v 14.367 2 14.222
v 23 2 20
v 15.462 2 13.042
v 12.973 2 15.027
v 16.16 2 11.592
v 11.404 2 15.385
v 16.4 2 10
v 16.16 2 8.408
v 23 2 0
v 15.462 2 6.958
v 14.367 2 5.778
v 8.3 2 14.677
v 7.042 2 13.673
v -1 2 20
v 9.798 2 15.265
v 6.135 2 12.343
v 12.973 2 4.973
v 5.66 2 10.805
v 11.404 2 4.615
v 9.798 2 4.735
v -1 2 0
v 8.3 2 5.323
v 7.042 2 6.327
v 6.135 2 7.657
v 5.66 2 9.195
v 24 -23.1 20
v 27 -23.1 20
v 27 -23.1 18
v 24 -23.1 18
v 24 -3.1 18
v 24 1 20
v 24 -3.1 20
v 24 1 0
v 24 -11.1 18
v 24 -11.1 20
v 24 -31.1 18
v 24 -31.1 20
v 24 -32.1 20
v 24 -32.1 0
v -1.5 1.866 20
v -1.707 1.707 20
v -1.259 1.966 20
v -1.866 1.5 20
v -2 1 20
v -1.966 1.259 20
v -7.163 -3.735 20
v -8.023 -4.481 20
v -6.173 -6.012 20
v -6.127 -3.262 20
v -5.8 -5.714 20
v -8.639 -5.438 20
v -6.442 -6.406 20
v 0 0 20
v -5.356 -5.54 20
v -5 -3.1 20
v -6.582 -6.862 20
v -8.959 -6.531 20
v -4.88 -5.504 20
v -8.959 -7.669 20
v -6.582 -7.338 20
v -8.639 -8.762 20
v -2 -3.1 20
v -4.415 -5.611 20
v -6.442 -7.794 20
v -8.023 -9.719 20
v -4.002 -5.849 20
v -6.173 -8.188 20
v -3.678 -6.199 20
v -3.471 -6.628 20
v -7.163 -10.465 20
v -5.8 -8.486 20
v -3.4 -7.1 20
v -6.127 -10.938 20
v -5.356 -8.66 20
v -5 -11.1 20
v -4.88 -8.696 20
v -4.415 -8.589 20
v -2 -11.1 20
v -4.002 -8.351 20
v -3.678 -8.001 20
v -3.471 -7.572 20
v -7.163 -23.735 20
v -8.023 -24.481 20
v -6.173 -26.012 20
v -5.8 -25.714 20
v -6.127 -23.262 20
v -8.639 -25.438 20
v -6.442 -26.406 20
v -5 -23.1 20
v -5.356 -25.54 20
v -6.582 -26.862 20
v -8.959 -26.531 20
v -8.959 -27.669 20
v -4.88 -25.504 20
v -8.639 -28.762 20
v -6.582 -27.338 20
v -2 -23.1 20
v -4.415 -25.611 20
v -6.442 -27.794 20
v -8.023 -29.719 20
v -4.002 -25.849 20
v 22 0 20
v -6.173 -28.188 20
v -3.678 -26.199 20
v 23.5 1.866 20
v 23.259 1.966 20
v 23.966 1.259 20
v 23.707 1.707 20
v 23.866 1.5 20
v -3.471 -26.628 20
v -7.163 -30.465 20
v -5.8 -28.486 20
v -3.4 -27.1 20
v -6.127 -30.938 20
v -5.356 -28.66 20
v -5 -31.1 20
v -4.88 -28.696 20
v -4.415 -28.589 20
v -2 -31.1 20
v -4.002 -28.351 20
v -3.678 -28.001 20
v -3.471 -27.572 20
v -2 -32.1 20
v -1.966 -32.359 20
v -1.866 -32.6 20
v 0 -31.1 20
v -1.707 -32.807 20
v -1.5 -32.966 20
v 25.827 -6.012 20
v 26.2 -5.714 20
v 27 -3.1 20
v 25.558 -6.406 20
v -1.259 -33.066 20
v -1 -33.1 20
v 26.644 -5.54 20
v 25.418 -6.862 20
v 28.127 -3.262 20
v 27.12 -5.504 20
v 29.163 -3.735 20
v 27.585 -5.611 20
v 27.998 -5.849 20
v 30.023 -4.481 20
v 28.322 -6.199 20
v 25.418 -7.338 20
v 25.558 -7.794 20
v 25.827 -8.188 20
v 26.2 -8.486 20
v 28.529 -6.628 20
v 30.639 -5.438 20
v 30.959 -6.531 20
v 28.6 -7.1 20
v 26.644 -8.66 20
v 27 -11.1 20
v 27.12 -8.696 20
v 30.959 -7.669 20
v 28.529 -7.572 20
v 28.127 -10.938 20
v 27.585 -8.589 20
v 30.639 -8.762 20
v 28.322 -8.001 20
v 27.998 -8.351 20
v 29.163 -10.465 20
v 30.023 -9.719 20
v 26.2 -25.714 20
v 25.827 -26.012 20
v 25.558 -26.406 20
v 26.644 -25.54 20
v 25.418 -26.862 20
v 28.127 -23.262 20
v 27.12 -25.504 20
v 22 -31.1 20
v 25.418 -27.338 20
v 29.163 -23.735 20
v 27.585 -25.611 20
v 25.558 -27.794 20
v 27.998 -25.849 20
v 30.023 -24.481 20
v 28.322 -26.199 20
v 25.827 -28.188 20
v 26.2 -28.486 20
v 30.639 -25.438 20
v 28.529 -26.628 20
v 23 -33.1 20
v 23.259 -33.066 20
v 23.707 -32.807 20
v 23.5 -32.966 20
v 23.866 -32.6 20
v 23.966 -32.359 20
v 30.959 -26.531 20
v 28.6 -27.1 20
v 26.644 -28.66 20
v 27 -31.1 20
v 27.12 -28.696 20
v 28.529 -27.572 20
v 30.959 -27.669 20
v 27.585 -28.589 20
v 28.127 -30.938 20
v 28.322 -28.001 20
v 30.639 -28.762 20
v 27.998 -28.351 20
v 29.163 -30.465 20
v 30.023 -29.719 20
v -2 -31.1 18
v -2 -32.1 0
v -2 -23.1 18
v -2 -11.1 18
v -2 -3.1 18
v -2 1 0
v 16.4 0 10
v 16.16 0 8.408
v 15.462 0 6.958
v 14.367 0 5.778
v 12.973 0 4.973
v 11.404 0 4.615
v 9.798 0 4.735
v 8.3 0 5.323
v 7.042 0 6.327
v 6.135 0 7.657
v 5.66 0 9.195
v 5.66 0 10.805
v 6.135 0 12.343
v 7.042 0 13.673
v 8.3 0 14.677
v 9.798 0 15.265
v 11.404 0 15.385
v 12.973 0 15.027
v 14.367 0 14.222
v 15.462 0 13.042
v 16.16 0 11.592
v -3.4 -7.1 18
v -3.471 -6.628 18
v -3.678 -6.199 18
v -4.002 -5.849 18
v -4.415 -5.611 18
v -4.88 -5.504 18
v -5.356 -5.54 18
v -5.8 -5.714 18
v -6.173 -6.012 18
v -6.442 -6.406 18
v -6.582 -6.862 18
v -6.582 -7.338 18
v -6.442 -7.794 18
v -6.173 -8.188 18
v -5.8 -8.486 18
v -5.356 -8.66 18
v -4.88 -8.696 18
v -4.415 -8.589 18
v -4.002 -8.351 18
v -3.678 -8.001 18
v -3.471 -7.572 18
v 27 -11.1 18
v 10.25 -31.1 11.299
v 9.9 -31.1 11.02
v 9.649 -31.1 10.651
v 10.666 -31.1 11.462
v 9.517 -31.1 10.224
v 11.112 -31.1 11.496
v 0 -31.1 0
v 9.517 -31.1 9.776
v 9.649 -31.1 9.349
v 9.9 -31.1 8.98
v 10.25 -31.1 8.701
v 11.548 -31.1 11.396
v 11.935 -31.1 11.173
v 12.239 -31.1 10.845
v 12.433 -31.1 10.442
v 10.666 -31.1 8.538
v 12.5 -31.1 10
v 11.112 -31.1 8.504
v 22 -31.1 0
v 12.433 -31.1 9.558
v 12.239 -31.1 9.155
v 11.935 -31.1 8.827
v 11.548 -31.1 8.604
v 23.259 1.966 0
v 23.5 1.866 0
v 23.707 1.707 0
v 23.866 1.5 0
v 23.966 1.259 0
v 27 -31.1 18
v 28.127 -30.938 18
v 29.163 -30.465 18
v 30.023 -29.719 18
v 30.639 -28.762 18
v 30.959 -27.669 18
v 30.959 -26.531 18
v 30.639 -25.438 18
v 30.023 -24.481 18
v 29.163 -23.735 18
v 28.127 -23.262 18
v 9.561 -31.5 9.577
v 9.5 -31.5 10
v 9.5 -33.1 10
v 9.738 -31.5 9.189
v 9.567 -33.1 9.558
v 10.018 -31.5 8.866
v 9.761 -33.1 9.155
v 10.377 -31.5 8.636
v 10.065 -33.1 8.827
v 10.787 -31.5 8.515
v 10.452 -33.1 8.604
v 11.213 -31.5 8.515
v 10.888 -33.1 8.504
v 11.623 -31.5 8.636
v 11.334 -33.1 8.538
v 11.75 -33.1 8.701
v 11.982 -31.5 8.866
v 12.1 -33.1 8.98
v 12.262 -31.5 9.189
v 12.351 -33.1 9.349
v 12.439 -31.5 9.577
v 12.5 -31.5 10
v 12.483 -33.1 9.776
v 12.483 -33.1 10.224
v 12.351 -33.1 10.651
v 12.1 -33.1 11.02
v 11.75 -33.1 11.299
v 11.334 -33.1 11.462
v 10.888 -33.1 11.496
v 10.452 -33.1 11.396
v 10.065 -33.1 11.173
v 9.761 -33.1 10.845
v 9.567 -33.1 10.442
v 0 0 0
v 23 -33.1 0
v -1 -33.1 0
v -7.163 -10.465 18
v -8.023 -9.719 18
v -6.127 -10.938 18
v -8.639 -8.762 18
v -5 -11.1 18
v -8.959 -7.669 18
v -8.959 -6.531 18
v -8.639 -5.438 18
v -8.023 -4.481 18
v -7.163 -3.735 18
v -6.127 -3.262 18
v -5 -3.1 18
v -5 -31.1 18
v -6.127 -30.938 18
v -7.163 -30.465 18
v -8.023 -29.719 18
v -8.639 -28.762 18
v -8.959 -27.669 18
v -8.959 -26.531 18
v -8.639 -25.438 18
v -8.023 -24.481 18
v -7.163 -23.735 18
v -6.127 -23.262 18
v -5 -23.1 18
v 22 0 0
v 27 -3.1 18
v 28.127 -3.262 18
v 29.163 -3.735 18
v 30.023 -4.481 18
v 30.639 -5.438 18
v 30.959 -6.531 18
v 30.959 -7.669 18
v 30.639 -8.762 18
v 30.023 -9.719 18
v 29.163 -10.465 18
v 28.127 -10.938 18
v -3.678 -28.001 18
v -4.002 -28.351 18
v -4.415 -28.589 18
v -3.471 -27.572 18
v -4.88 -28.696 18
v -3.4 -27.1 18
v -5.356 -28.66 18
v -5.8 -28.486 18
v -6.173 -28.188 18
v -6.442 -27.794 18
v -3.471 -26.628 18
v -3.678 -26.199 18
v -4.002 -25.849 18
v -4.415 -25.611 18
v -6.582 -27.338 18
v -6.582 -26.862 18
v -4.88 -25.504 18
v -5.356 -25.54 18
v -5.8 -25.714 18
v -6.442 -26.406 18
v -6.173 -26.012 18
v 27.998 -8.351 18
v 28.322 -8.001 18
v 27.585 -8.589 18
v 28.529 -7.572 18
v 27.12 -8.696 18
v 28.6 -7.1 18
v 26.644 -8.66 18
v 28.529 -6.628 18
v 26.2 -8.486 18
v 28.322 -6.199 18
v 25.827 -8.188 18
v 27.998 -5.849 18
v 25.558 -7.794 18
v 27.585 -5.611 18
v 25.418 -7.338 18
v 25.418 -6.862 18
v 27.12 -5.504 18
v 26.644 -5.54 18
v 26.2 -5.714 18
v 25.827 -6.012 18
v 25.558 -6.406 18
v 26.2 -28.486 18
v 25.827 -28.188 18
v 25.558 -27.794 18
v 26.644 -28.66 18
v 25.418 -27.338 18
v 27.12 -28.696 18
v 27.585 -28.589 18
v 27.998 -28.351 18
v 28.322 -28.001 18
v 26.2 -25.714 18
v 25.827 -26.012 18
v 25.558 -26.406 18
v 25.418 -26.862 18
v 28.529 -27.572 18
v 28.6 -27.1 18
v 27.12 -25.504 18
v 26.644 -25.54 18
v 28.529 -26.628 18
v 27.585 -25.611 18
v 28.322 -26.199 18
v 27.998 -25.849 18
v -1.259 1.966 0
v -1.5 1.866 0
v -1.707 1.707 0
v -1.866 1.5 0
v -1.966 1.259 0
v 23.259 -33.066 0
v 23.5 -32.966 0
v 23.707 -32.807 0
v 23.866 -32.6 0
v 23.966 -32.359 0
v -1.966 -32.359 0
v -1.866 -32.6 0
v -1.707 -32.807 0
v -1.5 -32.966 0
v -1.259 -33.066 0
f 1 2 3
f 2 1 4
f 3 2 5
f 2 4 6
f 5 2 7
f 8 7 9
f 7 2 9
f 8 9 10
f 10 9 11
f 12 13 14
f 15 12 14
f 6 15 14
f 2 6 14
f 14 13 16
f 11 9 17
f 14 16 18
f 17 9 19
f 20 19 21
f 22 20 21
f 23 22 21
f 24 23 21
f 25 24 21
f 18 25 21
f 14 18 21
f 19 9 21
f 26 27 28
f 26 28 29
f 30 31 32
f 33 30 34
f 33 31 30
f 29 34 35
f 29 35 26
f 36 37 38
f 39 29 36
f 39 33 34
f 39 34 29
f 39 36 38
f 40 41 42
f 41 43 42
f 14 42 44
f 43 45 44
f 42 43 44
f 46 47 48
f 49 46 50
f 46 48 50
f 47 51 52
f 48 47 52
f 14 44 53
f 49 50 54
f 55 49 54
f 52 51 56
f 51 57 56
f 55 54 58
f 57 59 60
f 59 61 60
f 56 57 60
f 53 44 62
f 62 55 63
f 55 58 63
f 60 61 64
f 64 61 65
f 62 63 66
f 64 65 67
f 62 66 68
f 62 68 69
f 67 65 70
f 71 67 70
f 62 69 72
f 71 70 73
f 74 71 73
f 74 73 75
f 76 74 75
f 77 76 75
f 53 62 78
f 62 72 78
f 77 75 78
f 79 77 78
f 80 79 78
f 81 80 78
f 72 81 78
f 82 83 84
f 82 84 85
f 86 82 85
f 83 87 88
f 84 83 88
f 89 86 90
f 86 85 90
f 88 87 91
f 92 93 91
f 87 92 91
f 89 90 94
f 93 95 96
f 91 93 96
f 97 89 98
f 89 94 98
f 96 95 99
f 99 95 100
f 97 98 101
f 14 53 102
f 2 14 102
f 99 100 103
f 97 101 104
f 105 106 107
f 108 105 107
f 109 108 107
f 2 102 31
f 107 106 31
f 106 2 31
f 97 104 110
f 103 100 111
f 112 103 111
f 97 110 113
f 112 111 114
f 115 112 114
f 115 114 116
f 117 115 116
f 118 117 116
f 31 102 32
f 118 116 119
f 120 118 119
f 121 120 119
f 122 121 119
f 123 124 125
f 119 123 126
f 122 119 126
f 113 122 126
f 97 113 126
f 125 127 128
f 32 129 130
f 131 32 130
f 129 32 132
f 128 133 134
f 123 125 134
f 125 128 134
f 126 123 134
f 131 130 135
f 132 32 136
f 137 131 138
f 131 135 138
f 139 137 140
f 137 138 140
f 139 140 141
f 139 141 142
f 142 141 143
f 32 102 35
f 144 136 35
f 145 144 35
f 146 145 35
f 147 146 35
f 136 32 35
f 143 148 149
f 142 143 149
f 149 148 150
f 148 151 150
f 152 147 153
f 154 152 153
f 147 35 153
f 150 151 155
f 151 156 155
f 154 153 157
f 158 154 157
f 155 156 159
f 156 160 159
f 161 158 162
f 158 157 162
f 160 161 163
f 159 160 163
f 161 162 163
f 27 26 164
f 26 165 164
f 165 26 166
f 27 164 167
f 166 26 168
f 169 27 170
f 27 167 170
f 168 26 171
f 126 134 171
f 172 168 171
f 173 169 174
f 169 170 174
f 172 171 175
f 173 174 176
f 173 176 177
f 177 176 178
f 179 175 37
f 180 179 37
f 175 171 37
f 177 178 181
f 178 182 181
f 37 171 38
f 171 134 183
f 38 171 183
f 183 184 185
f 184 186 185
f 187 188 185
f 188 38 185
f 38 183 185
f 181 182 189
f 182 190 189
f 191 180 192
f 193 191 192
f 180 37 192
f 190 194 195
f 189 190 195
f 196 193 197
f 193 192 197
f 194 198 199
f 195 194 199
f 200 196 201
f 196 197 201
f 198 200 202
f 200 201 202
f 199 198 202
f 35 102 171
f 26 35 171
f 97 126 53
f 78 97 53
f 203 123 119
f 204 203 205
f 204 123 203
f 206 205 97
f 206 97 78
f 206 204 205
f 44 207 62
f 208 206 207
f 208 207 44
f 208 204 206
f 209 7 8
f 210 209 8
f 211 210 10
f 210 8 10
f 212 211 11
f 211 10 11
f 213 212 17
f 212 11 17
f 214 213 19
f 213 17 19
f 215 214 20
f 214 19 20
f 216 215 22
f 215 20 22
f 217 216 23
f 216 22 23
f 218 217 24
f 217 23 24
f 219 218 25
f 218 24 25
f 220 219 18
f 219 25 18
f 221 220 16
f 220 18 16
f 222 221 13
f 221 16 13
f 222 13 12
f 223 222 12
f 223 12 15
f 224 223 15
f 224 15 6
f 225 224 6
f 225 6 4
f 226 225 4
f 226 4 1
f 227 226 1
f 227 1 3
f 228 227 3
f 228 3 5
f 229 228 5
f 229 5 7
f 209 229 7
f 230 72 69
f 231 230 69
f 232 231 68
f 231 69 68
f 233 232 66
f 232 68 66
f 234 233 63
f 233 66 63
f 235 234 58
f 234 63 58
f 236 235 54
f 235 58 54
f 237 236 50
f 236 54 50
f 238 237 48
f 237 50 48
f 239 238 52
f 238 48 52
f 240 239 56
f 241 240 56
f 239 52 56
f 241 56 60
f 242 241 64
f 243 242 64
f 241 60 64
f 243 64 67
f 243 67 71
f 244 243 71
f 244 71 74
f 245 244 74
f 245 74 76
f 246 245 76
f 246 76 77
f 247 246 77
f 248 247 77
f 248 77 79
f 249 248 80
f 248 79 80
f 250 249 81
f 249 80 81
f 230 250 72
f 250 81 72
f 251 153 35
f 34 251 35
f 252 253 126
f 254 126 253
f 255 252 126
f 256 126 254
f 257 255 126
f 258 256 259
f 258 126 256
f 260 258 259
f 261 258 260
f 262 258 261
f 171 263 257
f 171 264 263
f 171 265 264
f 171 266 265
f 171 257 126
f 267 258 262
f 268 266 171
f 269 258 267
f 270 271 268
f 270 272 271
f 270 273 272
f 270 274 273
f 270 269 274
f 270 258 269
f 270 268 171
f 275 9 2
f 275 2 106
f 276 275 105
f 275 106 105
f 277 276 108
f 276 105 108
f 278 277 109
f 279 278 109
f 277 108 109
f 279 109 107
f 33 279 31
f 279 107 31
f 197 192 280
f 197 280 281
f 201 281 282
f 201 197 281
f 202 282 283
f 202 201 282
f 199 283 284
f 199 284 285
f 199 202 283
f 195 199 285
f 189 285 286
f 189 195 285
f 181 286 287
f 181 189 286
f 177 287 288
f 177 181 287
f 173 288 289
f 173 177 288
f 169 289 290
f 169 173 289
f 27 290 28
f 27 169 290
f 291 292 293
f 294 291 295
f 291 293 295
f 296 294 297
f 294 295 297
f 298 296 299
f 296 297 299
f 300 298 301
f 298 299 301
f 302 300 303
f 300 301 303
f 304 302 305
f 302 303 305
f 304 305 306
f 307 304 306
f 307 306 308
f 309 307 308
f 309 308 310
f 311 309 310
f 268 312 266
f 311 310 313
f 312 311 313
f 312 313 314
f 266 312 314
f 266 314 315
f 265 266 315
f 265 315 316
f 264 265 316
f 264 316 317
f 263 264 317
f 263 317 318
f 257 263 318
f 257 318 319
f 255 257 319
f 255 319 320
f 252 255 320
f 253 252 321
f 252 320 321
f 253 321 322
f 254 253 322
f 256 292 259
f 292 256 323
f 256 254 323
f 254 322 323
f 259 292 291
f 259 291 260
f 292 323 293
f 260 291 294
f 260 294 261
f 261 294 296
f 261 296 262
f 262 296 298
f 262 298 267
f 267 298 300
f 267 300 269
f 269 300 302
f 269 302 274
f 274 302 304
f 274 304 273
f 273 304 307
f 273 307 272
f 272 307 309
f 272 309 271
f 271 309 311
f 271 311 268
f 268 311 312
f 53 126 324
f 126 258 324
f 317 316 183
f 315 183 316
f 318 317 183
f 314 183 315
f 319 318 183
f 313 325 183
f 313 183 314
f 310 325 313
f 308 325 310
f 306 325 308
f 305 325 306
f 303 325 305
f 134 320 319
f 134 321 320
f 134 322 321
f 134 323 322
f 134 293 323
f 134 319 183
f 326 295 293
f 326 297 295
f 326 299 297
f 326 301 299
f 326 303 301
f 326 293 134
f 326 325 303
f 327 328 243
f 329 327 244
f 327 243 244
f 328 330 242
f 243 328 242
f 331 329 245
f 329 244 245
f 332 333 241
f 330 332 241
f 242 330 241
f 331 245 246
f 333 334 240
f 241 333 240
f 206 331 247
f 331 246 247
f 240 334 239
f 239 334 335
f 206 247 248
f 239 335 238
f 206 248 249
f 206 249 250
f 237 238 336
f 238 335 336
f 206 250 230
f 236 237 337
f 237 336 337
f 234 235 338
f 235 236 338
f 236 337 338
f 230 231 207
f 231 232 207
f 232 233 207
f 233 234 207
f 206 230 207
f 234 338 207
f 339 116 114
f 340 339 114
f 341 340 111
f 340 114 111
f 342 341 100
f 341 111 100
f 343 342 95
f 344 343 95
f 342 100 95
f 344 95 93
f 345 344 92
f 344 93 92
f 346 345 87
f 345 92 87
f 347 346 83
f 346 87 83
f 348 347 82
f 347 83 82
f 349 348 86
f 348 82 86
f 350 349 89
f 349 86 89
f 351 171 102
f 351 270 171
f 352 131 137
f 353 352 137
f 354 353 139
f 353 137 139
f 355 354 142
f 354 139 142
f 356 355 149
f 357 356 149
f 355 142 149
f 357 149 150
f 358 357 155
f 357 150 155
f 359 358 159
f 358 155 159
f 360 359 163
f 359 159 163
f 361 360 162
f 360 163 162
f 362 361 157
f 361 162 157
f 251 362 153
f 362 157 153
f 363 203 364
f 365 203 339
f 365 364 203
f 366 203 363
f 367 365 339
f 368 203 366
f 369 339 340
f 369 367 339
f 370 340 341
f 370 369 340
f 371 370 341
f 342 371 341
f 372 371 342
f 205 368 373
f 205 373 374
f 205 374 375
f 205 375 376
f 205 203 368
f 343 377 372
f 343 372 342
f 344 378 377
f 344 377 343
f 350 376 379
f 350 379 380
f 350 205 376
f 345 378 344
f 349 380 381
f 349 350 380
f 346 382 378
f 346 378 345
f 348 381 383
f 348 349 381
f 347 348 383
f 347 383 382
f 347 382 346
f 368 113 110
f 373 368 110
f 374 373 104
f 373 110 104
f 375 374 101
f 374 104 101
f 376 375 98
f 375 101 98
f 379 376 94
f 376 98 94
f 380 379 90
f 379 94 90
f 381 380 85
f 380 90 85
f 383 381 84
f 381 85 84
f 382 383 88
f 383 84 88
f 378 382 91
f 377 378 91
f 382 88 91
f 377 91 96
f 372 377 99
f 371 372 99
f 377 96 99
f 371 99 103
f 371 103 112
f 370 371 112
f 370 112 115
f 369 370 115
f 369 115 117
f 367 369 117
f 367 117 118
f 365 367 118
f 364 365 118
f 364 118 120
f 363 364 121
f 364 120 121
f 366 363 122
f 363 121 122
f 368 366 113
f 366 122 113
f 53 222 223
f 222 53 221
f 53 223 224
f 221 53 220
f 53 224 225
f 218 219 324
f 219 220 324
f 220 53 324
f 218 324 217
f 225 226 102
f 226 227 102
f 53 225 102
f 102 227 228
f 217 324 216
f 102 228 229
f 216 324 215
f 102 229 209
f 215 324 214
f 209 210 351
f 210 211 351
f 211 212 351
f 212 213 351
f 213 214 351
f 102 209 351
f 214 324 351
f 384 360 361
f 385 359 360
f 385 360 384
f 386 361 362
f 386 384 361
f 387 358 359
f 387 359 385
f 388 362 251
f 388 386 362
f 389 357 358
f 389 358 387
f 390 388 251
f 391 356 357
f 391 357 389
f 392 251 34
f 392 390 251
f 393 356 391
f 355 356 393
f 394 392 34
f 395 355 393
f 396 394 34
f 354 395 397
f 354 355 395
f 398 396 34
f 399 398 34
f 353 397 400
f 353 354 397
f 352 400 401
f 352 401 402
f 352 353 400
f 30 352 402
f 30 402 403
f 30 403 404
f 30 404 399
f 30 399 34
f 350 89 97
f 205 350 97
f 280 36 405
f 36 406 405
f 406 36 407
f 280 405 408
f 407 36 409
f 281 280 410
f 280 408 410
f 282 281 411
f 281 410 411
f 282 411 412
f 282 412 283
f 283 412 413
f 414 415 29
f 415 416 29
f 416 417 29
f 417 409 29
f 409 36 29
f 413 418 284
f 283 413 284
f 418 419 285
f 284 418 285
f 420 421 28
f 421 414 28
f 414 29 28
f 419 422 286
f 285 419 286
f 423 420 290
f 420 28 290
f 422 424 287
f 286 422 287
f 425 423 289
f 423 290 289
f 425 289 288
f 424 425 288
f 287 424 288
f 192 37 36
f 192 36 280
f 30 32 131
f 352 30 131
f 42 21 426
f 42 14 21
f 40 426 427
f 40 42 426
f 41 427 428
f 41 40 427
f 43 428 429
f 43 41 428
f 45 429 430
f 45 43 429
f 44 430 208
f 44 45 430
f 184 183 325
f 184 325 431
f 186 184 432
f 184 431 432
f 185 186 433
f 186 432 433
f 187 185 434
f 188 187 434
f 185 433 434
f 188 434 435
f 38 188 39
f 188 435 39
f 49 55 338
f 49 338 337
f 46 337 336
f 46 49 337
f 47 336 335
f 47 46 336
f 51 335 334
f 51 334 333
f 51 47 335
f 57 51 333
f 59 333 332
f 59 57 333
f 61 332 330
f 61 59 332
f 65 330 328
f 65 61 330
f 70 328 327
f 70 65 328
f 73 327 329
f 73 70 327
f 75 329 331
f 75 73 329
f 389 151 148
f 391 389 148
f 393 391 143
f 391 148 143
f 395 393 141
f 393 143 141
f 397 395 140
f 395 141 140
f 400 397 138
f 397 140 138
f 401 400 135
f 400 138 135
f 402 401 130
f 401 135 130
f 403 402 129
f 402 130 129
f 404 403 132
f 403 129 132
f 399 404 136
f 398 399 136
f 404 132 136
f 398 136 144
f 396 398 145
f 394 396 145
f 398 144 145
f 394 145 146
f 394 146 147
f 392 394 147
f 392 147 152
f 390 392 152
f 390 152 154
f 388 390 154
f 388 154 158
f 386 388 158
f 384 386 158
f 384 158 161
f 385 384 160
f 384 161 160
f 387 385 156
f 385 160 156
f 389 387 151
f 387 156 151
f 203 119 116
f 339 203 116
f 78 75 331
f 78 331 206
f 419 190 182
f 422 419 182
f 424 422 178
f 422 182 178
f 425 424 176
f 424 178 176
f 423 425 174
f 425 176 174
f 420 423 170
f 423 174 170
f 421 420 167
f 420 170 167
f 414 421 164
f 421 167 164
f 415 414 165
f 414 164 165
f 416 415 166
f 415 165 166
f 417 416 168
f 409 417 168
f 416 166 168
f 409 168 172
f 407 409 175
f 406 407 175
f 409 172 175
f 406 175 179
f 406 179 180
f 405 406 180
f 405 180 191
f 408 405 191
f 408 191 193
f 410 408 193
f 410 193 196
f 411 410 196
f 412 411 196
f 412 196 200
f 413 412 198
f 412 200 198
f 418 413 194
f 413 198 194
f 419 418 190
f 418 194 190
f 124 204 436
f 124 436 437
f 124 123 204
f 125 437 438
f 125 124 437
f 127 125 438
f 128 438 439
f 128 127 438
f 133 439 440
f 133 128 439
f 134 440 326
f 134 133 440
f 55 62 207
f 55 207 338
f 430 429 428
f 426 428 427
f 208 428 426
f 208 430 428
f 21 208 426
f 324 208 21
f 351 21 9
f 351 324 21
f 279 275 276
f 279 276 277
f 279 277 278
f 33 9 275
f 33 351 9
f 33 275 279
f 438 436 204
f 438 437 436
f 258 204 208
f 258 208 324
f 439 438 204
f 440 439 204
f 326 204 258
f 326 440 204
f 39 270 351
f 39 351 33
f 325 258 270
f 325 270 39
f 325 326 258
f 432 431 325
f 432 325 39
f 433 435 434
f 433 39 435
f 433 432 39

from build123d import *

# Parameters (mm, degrees)
SKETCH1_W           = 22
SKETCH1_H           = 31.5
BOSS_EXTRUDE1_DEPTH = 20
SKETCH2_R           = 5.4
CUT_EXTRUDE1_DEPTH  = 20
SKETCH3_R           = 1.5
CUT_EXTRUDE2_DEPTH  = 20
SKETCH4_W           = 22
SKETCH4_H           = 20
SKETCH4_R           = 1.5
BOSS_EXTRUDE2_DEPTH = 0.4
SKETCH5_R           = 44.087047381
CUT_EXTRUDE3_DEPTH  = 0.4
FILLET2_R           = 1
SKETCH6_R           = 1.6
BOSS_EXTRUDE3_DEPTH = 2


with BuildPart() as part:
    # Sketch1 → Boss-Extrude1 (new body)
    with BuildSketch(Plane.XY):
        Polygon((22, 2), (24, 2), (24, -33.5), (-2, -33.5), (-2, 2), align=None)
        with Locations((11, -15.75)):
            Rectangle(SKETCH1_W, SKETCH1_H, mode=Mode.SUBTRACT)
    extrude(amount=BOSS_EXTRUDE1_DEPTH)

    # Sketch2 → Cut-Extrude1 (cut)
    with BuildSketch(Plane(origin=(0, 2, 0), x_dir=(1, 0, 0), z_dir=(0, 1, 0))):
        with Locations((11, -10)):
            Circle(SKETCH2_R)
    extrude(amount=-CUT_EXTRUDE1_DEPTH, mode=Mode.SUBTRACT)

    # Sketch3 → Cut-Extrude2 (cut)
    with BuildSketch(Plane(origin=(0, -33.5, 0), x_dir=(-1, 0, 0), z_dir=(0, -1, 0))):
        with Locations((-11, -10)):
            Circle(SKETCH3_R)
    extrude(amount=-CUT_EXTRUDE2_DEPTH, mode=Mode.SUBTRACT)

    # Sketch4 → Boss-Extrude2 (add)
    with BuildSketch(Plane(origin=(0, -31.5, 0), x_dir=(1, 0, 0), z_dir=(0, 1, 0))):
        with Locations((11, -10)):
            Rectangle(SKETCH4_W, SKETCH4_H)
        with Locations((11, -10)):
            Circle(SKETCH4_R, mode=Mode.SUBTRACT)
    extrude(amount=BOSS_EXTRUDE2_DEPTH)

    # Sketch5 → Cut-Extrude3 (cut)
    with BuildSketch(Plane(origin=(0, -33.5, 0), x_dir=(-1, 0, 0), z_dir=(0, -1, 0))):
        with Locations((-11, -10)):
            Circle(SKETCH5_R)
    extrude(amount=-CUT_EXTRUDE3_DEPTH, mode=Mode.SUBTRACT)

    # Fillet2
    fillet2_edges = [part.edges().sort_by_distance(p)[0] for p in [
        (24, -33.1, 10),
        (-2, -33.1, 10),
        (-2, 2, 10),
        (24, 2, 10),
    ]]
    fillet(fillet2_edges, radius=FILLET2_R)

    # Sketch6 → Boss-Extrude3 (add)
    with BuildSketch(Plane.XY.offset(20)):
        with BuildLine():
            Line((22, -31.1), (27, -31.1))
            ThreePointArc((27, -31.1), (31, -27.1), (27, -23.1))
            Line((27, -23.1), (22, -23.1))
            Line((22, -23.1), (22, -31.1))
        make_face()
        with Locations((27, -27.1)):
            Circle(SKETCH6_R, mode=Mode.SUBTRACT)
        with BuildLine():
            Line((27, -11.1), (22, -11.1))
            Line((22, -11.1), (22, -3.1))
            Line((22, -3.1), (27, -3.1))
            ThreePointArc((27, -3.1), (31, -7.1), (27, -11.1))
        make_face()
        with Locations((27, -7.1)):
            Circle(SKETCH6_R, mode=Mode.SUBTRACT)
        with BuildLine():
            Line((0, -3.1), (-5, -3.1))
            ThreePointArc((-5, -3.1), (-9, -7.1), (-5, -11.1))
            Line((-5, -11.1), (0, -11.1))
            Line((0, -11.1), (0, -3.1))
        make_face()
        with Locations((-5, -7.1)):
            Circle(SKETCH6_R, mode=Mode.SUBTRACT)
        with BuildLine():
            Line((0, -23.1), (0, -31.1))
            Line((0, -31.1), (-5, -31.1))
            ThreePointArc((-5, -31.1), (-9, -27.1), (-5, -23.1))
            Line((-5, -23.1), (0, -23.1))
        make_face()
        with Locations((-5, -27.1)):
            Circle(SKETCH6_R, mode=Mode.SUBTRACT)
    extrude(amount=-BOSS_EXTRUDE3_DEPTH)


solid = part.part
